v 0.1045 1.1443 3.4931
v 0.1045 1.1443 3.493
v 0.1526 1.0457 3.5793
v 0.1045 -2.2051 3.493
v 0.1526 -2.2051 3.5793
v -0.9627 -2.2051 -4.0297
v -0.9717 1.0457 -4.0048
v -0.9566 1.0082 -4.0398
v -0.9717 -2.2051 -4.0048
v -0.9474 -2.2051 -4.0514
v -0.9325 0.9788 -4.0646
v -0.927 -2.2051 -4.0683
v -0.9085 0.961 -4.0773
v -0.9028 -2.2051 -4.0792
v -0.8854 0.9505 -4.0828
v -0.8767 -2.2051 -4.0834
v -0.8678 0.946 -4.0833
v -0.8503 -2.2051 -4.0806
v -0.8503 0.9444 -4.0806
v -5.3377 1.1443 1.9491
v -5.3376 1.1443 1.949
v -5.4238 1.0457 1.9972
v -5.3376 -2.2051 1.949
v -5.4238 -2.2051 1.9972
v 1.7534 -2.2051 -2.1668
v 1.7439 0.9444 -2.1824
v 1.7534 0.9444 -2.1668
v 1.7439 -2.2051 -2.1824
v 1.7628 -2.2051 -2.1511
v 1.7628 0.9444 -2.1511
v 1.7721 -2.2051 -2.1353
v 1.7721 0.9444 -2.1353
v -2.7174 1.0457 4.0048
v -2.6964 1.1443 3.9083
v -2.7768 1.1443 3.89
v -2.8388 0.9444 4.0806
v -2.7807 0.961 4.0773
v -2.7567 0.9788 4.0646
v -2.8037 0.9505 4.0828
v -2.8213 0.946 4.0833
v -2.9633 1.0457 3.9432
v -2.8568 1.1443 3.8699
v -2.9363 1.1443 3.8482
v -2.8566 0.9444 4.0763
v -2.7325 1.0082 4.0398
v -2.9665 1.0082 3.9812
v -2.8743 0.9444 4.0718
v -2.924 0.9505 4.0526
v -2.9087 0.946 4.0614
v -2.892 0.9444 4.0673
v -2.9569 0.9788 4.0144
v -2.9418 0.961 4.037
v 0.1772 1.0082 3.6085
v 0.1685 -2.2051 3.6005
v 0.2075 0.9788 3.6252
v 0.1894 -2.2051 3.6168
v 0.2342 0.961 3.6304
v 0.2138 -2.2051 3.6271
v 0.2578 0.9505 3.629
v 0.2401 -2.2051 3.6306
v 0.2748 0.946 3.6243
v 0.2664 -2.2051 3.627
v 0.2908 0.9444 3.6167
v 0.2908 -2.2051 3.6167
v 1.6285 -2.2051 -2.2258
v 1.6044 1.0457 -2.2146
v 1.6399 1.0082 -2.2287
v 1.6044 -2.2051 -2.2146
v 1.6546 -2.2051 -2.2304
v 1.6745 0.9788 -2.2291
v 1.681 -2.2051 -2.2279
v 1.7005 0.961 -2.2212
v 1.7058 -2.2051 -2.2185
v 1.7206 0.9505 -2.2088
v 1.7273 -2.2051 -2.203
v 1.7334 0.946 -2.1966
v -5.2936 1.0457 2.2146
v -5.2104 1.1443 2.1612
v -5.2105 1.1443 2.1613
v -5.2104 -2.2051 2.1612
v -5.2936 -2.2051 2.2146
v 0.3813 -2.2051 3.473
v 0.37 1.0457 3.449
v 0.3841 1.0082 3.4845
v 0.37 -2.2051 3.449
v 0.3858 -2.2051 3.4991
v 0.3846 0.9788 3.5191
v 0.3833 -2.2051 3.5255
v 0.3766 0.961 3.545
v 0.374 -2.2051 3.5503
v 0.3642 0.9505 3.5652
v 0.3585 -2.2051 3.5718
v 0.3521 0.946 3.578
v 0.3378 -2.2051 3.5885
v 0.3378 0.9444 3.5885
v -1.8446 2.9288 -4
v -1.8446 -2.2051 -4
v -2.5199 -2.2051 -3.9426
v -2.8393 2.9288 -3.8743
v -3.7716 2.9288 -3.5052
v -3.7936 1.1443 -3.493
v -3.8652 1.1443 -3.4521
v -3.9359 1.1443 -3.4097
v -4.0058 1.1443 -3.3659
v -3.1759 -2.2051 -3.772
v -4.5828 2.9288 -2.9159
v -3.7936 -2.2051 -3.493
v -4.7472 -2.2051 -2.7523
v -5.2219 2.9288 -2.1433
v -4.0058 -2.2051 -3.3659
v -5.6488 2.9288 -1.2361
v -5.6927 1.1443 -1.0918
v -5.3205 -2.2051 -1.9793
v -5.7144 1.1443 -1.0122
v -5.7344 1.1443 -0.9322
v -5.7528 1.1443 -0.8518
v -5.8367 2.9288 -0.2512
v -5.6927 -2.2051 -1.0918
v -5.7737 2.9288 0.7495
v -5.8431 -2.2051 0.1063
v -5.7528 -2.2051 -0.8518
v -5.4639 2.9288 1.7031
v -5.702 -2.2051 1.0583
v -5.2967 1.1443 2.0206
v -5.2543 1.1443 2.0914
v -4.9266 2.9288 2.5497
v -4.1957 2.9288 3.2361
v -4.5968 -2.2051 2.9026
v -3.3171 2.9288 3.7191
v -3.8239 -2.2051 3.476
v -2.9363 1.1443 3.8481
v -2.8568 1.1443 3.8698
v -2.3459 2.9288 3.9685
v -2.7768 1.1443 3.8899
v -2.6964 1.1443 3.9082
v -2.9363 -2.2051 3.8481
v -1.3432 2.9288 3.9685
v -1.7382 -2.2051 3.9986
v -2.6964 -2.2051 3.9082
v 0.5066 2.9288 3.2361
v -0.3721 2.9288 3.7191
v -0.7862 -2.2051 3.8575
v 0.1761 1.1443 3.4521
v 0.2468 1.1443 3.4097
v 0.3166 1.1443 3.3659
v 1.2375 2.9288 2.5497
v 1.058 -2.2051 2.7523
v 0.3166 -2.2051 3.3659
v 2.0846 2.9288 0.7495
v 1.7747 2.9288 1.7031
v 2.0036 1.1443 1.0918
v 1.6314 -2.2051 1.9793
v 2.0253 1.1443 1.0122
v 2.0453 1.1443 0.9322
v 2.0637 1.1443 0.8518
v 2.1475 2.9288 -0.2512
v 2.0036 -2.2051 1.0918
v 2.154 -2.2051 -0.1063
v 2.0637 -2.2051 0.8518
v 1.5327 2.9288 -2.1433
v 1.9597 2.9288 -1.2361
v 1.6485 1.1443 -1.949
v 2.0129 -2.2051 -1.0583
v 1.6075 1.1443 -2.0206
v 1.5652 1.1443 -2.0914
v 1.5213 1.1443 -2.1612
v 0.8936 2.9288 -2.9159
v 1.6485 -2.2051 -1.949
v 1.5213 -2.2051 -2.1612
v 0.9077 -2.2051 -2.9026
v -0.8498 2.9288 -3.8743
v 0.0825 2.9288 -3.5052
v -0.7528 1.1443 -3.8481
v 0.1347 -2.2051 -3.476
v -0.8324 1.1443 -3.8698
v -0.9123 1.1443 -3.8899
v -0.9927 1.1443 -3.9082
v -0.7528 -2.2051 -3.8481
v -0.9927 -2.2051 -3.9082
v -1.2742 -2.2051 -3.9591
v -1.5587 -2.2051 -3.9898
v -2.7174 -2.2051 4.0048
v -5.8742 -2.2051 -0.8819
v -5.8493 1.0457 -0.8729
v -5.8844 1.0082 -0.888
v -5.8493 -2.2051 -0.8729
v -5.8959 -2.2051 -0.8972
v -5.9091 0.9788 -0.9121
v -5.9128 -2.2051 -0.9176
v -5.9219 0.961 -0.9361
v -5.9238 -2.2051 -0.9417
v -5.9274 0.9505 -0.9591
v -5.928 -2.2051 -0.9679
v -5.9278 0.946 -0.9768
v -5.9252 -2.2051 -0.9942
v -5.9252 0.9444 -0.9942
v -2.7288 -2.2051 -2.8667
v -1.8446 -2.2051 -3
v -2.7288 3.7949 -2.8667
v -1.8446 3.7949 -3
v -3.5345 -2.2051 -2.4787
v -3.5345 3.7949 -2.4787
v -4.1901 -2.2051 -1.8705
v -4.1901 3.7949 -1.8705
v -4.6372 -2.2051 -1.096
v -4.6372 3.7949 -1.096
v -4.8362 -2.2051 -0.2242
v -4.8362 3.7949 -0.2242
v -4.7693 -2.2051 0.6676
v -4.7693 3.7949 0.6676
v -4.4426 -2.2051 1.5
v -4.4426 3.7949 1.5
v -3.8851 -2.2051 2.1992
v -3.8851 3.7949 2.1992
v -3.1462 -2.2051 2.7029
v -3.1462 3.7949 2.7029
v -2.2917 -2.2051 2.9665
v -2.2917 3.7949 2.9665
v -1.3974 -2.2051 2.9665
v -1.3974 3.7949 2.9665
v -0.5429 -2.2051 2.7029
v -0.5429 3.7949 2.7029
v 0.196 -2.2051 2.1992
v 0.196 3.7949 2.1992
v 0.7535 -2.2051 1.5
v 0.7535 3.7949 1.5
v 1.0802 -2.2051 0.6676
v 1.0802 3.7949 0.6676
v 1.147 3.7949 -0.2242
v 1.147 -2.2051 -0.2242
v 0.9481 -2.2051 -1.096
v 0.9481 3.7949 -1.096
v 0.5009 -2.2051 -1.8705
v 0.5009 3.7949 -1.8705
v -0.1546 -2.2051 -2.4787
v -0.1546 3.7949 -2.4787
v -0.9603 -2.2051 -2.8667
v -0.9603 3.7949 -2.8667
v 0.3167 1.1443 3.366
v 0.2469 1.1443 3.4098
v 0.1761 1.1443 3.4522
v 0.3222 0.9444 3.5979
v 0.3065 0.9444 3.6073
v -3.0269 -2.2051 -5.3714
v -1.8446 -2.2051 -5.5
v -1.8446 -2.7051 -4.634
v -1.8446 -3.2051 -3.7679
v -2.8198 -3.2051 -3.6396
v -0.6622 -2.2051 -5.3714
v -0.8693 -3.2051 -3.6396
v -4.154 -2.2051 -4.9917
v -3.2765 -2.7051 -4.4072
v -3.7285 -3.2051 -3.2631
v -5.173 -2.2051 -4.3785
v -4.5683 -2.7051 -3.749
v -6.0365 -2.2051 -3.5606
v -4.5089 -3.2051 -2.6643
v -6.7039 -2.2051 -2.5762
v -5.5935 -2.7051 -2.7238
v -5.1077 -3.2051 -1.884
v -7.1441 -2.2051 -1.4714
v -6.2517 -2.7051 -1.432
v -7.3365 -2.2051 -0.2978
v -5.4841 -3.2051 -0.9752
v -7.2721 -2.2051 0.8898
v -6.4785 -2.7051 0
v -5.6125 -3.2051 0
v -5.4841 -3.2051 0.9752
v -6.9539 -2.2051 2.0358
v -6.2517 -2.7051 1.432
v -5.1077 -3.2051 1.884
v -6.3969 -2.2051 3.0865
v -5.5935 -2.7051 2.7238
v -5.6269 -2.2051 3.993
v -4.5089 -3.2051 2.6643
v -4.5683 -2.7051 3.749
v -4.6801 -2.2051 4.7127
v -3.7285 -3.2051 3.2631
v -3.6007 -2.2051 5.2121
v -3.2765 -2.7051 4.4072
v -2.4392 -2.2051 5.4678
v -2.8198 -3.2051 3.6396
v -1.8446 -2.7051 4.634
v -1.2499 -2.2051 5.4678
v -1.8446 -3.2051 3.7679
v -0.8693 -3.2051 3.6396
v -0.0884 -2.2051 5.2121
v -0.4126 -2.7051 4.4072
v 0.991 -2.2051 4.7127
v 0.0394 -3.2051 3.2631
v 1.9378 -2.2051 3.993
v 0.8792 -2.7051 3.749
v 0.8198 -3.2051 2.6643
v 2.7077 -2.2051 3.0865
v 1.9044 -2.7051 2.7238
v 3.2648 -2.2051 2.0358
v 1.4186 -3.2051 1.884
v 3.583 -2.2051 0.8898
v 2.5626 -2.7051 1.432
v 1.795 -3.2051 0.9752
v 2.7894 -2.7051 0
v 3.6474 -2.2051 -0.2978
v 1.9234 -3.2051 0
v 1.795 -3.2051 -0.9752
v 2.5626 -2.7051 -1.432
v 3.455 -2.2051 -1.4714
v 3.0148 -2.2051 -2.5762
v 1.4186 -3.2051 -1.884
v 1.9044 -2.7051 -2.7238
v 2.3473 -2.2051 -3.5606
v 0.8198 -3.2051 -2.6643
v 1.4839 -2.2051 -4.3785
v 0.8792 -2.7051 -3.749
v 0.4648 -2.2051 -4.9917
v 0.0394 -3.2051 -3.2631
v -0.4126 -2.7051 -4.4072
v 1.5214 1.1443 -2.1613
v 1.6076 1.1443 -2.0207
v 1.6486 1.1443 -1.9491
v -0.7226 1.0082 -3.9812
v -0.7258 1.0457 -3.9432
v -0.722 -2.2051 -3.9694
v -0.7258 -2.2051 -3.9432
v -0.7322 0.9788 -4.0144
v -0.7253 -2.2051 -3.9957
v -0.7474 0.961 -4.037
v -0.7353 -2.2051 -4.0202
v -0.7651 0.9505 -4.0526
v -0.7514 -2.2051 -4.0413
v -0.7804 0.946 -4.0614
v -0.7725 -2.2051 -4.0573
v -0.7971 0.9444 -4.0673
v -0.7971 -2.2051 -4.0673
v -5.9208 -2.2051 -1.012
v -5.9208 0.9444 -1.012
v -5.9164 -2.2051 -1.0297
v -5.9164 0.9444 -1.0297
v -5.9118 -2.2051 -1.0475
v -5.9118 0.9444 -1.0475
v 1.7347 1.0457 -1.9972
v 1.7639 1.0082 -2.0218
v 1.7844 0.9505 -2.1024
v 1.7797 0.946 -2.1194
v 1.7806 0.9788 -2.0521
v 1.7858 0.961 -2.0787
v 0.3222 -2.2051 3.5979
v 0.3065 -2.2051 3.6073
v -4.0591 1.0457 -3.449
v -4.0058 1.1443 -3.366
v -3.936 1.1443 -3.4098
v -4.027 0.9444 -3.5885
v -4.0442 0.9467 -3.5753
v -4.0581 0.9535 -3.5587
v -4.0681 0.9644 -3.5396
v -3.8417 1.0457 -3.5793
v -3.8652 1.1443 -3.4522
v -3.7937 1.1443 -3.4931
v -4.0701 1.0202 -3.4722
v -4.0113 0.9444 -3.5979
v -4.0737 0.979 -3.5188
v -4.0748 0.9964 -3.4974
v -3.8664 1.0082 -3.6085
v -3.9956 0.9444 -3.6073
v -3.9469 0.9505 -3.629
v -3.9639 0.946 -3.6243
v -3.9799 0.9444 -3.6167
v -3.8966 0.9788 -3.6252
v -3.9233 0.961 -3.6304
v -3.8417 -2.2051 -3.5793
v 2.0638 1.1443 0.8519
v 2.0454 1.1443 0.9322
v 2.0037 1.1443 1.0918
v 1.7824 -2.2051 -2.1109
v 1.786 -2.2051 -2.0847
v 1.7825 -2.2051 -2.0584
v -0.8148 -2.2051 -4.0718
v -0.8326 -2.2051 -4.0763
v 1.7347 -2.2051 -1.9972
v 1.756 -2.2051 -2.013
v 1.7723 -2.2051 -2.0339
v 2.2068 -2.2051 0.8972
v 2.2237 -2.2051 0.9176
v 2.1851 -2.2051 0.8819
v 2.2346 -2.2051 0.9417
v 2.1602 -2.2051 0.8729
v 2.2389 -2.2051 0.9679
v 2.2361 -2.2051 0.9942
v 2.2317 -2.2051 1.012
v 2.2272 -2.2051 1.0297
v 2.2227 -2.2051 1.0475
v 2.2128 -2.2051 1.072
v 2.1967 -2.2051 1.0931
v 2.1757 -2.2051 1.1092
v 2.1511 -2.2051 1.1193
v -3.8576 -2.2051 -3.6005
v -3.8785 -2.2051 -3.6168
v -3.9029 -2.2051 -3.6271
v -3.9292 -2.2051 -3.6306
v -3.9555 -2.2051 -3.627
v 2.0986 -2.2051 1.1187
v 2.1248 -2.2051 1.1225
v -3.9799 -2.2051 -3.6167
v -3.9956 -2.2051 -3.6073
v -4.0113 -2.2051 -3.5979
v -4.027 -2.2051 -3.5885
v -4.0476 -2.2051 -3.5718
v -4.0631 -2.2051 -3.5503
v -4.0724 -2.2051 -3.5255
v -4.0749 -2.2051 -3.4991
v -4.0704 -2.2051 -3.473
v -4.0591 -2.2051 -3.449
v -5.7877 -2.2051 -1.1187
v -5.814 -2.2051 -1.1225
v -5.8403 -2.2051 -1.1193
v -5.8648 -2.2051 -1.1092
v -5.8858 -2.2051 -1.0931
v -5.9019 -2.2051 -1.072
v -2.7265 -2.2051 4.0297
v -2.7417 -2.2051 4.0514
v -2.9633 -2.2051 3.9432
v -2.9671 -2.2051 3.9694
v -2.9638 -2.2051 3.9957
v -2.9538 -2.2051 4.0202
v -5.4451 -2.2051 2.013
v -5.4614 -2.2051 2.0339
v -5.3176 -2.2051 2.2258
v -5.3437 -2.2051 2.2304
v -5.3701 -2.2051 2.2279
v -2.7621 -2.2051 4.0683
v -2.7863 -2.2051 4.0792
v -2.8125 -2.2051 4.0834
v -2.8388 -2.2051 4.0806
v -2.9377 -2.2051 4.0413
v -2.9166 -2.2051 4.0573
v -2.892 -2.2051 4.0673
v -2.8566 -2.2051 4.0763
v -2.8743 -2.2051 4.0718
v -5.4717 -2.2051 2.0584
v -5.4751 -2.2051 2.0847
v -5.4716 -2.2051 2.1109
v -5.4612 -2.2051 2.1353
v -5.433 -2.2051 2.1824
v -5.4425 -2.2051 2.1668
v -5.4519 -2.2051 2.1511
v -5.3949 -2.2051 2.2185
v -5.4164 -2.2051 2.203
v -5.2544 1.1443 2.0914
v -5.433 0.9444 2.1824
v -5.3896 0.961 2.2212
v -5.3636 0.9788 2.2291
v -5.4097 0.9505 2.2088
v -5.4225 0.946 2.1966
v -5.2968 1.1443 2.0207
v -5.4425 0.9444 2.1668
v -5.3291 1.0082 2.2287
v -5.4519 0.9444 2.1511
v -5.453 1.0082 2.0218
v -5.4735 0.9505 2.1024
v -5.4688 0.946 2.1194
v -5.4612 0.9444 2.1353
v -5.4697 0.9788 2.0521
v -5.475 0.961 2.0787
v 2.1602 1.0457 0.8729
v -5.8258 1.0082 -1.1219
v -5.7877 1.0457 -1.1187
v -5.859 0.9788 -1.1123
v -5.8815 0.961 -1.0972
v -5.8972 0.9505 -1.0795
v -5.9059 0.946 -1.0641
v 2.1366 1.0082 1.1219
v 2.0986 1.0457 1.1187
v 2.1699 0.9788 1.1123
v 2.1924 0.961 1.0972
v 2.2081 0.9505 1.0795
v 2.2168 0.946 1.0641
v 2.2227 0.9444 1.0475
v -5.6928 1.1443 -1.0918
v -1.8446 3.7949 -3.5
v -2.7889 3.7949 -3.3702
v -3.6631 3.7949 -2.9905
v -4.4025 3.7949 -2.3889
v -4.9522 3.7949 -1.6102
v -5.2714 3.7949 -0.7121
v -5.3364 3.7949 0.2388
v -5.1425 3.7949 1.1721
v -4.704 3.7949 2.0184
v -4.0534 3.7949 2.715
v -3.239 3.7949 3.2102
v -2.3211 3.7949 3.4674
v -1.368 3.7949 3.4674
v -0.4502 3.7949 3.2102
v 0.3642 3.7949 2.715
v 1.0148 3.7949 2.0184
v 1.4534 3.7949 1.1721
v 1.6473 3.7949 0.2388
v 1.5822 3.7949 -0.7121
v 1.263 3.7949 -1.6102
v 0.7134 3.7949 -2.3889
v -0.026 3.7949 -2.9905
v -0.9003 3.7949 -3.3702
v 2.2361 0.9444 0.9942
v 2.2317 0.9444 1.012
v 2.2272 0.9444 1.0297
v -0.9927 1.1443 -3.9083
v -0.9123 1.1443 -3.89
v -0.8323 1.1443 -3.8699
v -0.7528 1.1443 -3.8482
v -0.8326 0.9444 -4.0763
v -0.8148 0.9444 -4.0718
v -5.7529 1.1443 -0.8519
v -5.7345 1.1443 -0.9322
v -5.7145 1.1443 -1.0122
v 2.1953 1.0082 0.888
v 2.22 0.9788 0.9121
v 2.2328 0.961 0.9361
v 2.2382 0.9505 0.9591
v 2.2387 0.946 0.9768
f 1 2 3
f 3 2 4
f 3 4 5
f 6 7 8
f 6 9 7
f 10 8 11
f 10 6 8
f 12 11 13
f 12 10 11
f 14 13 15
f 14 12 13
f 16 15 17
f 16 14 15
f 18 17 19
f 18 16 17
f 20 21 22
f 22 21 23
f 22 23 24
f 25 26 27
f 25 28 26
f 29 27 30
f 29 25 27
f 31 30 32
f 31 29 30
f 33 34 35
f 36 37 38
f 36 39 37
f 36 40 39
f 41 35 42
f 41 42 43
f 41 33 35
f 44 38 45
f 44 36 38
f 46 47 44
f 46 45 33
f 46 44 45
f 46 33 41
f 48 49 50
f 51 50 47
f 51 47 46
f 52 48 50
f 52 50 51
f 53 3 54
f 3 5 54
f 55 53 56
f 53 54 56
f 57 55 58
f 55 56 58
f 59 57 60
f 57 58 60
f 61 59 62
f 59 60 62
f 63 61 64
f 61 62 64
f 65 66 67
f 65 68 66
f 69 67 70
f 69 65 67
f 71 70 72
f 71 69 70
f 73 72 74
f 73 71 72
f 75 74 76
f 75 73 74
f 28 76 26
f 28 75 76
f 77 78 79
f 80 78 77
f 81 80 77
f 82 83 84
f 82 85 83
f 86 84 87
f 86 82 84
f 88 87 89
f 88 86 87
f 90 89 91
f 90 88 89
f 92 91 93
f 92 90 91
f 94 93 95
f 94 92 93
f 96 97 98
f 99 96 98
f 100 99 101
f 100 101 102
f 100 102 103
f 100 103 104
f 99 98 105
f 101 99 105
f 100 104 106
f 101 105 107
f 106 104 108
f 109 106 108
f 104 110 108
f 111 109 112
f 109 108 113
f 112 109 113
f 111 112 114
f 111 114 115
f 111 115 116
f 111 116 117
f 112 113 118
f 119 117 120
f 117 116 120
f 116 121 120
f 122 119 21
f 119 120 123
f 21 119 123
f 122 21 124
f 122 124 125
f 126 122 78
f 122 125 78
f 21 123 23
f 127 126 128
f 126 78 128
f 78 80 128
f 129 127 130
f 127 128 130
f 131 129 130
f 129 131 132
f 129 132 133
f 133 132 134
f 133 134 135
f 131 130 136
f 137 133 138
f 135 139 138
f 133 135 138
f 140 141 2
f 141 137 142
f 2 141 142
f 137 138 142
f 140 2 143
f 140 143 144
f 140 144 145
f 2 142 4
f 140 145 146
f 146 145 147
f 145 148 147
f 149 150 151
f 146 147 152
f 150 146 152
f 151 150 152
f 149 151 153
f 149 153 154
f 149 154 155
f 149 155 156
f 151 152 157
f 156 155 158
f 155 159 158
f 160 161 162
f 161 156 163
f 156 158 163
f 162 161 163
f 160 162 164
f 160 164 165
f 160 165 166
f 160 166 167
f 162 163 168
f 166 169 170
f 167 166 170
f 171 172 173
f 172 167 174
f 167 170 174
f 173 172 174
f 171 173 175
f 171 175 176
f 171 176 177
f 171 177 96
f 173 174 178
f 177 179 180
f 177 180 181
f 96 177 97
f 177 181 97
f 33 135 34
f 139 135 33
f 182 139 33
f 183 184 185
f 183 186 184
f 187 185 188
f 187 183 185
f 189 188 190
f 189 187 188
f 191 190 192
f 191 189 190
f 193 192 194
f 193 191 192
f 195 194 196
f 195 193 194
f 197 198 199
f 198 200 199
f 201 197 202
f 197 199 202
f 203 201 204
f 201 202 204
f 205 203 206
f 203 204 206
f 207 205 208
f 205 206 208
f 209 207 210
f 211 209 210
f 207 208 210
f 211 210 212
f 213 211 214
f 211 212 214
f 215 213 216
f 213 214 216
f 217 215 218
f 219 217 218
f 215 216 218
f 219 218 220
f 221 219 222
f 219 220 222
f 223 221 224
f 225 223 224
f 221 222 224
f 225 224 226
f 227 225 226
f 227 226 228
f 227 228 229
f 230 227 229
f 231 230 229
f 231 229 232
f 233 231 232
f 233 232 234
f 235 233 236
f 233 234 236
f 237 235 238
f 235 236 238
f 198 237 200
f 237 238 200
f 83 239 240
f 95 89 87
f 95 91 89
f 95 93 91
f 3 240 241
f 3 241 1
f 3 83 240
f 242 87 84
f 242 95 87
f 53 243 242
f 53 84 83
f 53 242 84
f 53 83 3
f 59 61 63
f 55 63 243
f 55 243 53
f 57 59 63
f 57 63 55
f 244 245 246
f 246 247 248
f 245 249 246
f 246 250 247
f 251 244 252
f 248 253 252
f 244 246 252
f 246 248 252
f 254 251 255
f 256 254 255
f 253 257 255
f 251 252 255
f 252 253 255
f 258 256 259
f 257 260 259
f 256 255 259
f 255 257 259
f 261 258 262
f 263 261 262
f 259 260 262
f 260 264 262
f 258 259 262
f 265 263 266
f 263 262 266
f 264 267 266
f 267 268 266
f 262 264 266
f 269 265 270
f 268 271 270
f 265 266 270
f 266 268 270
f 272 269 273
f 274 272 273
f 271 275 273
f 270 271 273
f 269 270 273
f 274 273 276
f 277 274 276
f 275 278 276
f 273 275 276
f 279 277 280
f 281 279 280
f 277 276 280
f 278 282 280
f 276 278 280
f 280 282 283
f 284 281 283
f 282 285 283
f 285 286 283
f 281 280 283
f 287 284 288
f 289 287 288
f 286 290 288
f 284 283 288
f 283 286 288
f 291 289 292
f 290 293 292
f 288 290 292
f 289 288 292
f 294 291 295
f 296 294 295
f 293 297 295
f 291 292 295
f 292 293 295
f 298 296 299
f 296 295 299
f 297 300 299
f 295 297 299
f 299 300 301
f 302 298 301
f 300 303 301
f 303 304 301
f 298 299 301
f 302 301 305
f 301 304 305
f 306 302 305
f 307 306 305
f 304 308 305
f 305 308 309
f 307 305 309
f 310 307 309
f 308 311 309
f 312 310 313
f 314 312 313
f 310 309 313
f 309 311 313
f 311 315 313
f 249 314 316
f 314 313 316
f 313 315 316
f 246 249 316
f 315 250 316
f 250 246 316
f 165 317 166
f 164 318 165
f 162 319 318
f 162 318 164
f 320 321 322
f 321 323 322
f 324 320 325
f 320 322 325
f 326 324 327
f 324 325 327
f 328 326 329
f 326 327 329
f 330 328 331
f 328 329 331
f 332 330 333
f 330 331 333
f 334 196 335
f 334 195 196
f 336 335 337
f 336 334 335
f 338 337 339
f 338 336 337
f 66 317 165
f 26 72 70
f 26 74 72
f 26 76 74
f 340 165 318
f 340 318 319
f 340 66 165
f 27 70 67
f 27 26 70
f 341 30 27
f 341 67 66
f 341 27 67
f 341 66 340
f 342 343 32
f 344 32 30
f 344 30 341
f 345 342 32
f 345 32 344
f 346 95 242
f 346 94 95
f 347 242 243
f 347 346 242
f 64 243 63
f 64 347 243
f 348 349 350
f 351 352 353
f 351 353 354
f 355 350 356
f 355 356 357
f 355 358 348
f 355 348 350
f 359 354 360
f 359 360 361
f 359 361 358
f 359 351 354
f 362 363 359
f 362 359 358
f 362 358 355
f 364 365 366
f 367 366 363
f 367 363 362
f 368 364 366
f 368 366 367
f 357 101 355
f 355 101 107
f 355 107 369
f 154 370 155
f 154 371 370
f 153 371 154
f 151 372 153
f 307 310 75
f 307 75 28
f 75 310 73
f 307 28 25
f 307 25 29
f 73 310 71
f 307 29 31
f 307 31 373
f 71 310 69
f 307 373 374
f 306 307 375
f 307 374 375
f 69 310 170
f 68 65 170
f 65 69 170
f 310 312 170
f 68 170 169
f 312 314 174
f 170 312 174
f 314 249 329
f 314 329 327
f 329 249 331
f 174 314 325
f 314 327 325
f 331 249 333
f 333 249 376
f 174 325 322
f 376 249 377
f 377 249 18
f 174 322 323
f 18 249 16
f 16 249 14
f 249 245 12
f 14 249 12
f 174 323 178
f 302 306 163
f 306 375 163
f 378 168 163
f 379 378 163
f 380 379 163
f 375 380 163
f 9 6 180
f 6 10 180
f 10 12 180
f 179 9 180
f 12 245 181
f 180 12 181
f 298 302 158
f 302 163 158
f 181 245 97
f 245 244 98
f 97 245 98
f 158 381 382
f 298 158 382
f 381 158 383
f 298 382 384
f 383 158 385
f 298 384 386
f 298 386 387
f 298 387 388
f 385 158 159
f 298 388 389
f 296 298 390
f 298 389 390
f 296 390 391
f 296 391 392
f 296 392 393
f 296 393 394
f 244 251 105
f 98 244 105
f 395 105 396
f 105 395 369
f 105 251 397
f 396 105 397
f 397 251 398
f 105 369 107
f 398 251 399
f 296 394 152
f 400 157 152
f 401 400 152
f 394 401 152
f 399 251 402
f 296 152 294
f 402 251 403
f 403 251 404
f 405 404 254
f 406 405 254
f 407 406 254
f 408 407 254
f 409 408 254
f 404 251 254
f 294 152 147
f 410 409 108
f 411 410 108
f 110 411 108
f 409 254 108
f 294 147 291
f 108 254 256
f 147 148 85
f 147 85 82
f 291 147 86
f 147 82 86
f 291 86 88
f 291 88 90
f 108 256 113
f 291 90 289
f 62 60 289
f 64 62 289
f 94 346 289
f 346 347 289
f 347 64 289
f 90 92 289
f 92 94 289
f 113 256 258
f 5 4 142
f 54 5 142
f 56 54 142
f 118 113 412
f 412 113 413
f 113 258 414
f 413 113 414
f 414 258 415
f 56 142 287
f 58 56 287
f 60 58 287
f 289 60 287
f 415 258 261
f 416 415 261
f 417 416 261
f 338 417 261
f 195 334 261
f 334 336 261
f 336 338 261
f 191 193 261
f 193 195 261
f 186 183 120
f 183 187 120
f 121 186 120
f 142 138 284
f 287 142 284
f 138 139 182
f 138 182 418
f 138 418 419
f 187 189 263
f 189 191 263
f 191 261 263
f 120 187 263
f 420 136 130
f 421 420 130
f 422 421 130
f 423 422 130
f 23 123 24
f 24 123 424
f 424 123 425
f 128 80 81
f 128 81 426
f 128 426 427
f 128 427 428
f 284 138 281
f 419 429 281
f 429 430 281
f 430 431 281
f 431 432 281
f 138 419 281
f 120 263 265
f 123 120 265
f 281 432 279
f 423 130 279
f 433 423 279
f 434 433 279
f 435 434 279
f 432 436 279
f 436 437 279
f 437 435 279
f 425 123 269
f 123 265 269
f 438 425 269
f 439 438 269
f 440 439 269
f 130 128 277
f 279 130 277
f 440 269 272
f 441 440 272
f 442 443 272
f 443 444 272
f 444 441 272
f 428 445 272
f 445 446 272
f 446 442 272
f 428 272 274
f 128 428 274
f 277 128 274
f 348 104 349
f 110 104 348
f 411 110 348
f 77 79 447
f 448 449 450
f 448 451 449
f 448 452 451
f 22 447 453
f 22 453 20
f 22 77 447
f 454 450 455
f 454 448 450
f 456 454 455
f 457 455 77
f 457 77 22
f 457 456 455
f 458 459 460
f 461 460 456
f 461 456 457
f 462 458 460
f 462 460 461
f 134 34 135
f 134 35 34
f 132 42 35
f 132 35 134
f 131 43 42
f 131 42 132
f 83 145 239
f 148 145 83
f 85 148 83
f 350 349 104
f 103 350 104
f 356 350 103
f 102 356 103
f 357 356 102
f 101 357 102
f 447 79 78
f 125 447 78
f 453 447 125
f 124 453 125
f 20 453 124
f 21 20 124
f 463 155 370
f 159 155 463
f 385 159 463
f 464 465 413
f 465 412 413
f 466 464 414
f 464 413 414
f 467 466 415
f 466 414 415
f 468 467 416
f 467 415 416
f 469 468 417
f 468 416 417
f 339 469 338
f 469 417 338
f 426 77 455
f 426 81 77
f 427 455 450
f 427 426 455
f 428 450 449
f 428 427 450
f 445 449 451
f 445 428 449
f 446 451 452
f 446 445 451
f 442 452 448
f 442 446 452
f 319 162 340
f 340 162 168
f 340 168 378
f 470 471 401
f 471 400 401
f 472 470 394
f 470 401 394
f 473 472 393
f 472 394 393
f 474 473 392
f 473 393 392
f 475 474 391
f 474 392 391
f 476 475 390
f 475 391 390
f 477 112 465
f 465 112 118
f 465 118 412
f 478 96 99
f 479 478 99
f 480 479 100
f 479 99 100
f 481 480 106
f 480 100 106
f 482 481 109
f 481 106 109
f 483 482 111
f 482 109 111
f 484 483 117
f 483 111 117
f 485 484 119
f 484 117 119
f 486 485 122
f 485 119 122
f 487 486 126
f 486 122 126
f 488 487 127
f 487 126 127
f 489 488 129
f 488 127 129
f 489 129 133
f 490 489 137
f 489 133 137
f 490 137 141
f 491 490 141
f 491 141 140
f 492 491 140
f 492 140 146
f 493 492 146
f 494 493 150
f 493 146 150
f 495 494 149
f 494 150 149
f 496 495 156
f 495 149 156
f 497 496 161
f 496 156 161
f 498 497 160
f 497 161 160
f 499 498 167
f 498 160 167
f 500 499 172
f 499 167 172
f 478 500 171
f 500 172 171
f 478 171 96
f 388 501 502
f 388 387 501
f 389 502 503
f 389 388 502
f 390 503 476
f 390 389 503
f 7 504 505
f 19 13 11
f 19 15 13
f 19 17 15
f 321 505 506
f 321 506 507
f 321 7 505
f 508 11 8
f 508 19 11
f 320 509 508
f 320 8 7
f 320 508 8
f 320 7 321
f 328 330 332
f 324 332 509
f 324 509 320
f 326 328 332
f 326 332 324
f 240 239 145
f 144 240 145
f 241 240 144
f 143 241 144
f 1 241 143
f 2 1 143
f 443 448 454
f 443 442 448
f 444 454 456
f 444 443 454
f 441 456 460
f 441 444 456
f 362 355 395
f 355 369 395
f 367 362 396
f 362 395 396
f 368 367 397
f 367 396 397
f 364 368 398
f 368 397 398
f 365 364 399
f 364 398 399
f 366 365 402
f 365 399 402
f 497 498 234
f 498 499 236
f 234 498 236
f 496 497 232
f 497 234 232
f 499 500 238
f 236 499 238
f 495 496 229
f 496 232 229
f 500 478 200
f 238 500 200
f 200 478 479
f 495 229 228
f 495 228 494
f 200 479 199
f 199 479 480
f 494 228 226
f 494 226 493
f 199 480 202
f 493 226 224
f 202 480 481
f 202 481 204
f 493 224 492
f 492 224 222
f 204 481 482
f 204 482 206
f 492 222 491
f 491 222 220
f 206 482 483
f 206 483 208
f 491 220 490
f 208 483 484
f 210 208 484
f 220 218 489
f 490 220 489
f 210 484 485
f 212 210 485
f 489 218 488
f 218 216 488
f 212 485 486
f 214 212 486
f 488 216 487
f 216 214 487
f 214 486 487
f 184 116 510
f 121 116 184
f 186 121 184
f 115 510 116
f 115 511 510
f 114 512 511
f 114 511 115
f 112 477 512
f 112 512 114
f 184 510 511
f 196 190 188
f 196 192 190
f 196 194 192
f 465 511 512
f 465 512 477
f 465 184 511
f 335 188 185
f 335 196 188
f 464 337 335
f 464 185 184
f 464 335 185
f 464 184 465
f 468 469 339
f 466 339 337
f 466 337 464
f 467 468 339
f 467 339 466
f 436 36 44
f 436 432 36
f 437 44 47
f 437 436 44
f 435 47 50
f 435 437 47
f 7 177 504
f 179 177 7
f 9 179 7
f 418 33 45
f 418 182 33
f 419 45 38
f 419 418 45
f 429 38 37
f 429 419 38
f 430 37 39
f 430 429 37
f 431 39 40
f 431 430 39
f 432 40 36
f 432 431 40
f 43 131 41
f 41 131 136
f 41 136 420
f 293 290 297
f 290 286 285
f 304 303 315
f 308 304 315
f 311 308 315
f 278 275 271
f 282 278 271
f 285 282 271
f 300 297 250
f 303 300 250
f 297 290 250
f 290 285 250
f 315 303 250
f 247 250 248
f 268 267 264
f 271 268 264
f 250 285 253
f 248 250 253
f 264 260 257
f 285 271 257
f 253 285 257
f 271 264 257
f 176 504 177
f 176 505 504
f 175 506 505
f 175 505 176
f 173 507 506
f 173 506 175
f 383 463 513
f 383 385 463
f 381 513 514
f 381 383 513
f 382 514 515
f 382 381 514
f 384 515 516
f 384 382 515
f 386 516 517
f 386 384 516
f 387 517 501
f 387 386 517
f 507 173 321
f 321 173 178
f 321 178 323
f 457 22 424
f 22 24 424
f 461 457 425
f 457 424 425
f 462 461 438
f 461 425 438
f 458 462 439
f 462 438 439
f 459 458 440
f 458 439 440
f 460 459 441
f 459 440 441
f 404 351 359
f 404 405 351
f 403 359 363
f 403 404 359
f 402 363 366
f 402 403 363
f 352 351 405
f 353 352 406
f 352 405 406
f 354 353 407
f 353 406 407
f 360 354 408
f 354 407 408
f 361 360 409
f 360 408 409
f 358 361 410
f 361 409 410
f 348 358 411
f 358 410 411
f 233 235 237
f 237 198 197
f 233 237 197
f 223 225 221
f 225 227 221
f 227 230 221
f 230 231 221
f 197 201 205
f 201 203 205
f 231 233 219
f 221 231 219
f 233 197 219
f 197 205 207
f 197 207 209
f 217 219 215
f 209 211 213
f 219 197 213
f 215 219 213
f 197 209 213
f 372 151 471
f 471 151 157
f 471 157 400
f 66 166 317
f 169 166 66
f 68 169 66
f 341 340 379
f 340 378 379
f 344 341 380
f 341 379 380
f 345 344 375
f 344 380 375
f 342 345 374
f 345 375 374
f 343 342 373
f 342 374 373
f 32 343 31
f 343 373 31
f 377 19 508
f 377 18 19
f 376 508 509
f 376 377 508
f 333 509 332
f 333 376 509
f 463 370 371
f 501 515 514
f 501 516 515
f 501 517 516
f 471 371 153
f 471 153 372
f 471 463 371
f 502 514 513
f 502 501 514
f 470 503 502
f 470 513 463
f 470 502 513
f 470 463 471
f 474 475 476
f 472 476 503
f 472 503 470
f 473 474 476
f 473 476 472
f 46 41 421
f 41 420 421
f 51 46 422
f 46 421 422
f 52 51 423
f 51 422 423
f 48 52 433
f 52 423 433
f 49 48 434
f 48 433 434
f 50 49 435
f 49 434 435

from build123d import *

# Parameters (mm, degrees)
CHANFREIN2_SIZE              = 1
CHANFREIN2_SIZE_2            = 1.732050808
CHANFREIN3_SIZE              = 0.5
CHANFREIN3_SIZE2             = 0.866025404
ENROULEMENT2_SECTION_W       = 0.2
ENROULEMENT2_SECTION_H       = 3.3494767
ENROULEMENT2_ANGLE           = 3.543505781
R_P_TITION_CIRCULAIRE3_COUNT = 8
CHANFREIN4_SIZE              = 0.2
CONG_1_R                     = 0.1


# Some blends are built 0.0001 mm under size
with BuildPart() as part:
    # Esquisse1 → Révolution1 (revolve)
    with BuildSketch(Plane.XY, mode=Mode.PRIVATE) as r_volution1_sk:
        Polygon((-5.844561756, 3.794871795), (-5.844561756, -2.205128205), (-7.344561756, -2.205128205), (-7.344561756, -3.205128205), (-1.844561756, -3.205128205), (-1.844561756, -2.205128205), (-4.844561756, -2.205128205), (-4.844561756, 3.794871795), align=None)
    revolve(r_volution1_sk.sketch.rotate(Axis((-1.844561756, -3.205128205, 0), (0, 1, 0)), 270), axis=Axis((-1.844561756, -3.205128205, 0), (0, 1, 0)))

    # Chanfrein2
    # the kernel refuses this chamfer: 1.732050808, 1 mm, written as the material it takes off along each edge
    with BuildSketch(Plane(origin=(-1.844561756, -3.205128205, 0), x_dir=(0, 0, -1), z_dir=(1, 0, 0))) as chanfrein2_piece_1:
        Polygon((5.5, CHANFREIN2_SIZE), (5.5 - CHANFREIN2_SIZE_2, 0), (5.5, 0), align=None)
    revolve(axis=Axis((-1.844561756, -3.205128205, 0), (0, 1, 0)), mode=Mode.SUBTRACT)

    # Chanfrein3
    chanfrein3_edges = [part.edges().sort_by_distance(p)[0] for p in [
        (-1.844561756, 3.794871795, 4),
    ]]
    chanfrein3_side = [part.faces().sort_by_distance(p)[0] for p in [
        (-1.844561756, 3.794871795, 3.113137085),
    ]]
    chamfer(chanfrein3_edges, length=CHANFREIN3_SIZE, length2=CHANFREIN3_SIZE2, reference=chanfrein3_side[0])

    # Enroulement2 section (on wrap section) → Enroulement2 (revolve)
    with BuildSketch(Plane(origin=(-1.844561756, 3.794871795, 0), x_dir=(-0.8414709848078965, 0, 0.5403023058681398), z_dir=(0.5403023058681398, 0, 0.8414709848078965))):
        with Locations((4.1, 4.32526165)):
            Rectangle(ENROULEMENT2_SECTION_W, ENROULEMENT2_SECTION_H)
    enroulement2 = revolve(axis=Axis((-1.844561756, 3.794871795, 0), (0, -1, 0)), revolution_arc=ENROULEMENT2_ANGLE)

    # Répétition circulaire3: Enroulement2 ×8 about axis
    r_p_tition_circulaire3_axis = Axis((-1.844561756, 0, 0), (0, 1, 0))
    for i in range(1, R_P_TITION_CIRCULAIRE3_COUNT):
        add(enroulement2.rotate(r_p_tition_circulaire3_axis, i * 360 / R_P_TITION_CIRCULAIRE3_COUNT))

    # Chanfrein4
    chanfrein4_edges = [part.edges().sort_by_distance(p)[0] for p in [
        (-2.865436347, 1.144348495, 4.074041614),
        (0.31435335, 1.144348495, 3.602649798),
        (2.229479857, 1.144348495, 1.020874591),
        (1.758088041, 1.144348495, -2.158915106),
        (-0.823687166, 1.144348495, -4.074041614),
        (-4.003476862, 1.144348495, -3.602649798),
        (-5.91860337, 1.144348495, -1.020874591),
        (-5.447211554, 1.144348495, 2.158915106),
    ]]
    chamfer(chanfrein4_edges, length=CHANFREIN4_SIZE - 0.0001)  # a hair under: the kernel refuses the full size

    # Congé1
    cong_1_edges = [part.edges().sort_by_distance(p)[0] for p in [
        (-2.7389871, -0.630339855, 4.103657308),
        (-2.990909484, -0.630339855, 4.04053052),
        (0.201934522, -0.630339855, 3.667676783),
        (2.195968764, -0.630339855, 1.146347728),
        (1.823115026, -0.630339855, -2.046496279),
        (-0.698214029, -0.630339855, -4.04053052),
        (-3.891058035, -0.630339855, -3.667676783),
        (-5.885092277, -0.630339855, -1.146347728),
        (-5.512238539, -0.630339855, 2.046496279),
        (-5.378739893, -0.630339855, 2.269269685),
        (-5.948219065, -0.630339855, -0.894425344),
        (-4.113831441, -0.630339855, -3.534178136),
        (-0.950136413, -0.630339855, -4.103657308),
        (1.68961638, -0.630339855, -2.269269685),
        (2.259095552, -0.630339855, 0.894425344),
        (0.424707928, -0.630339855, 3.534178136),
    ]]
    fillet(cong_1_edges, radius=CONG_1_R)


solid = part.part
